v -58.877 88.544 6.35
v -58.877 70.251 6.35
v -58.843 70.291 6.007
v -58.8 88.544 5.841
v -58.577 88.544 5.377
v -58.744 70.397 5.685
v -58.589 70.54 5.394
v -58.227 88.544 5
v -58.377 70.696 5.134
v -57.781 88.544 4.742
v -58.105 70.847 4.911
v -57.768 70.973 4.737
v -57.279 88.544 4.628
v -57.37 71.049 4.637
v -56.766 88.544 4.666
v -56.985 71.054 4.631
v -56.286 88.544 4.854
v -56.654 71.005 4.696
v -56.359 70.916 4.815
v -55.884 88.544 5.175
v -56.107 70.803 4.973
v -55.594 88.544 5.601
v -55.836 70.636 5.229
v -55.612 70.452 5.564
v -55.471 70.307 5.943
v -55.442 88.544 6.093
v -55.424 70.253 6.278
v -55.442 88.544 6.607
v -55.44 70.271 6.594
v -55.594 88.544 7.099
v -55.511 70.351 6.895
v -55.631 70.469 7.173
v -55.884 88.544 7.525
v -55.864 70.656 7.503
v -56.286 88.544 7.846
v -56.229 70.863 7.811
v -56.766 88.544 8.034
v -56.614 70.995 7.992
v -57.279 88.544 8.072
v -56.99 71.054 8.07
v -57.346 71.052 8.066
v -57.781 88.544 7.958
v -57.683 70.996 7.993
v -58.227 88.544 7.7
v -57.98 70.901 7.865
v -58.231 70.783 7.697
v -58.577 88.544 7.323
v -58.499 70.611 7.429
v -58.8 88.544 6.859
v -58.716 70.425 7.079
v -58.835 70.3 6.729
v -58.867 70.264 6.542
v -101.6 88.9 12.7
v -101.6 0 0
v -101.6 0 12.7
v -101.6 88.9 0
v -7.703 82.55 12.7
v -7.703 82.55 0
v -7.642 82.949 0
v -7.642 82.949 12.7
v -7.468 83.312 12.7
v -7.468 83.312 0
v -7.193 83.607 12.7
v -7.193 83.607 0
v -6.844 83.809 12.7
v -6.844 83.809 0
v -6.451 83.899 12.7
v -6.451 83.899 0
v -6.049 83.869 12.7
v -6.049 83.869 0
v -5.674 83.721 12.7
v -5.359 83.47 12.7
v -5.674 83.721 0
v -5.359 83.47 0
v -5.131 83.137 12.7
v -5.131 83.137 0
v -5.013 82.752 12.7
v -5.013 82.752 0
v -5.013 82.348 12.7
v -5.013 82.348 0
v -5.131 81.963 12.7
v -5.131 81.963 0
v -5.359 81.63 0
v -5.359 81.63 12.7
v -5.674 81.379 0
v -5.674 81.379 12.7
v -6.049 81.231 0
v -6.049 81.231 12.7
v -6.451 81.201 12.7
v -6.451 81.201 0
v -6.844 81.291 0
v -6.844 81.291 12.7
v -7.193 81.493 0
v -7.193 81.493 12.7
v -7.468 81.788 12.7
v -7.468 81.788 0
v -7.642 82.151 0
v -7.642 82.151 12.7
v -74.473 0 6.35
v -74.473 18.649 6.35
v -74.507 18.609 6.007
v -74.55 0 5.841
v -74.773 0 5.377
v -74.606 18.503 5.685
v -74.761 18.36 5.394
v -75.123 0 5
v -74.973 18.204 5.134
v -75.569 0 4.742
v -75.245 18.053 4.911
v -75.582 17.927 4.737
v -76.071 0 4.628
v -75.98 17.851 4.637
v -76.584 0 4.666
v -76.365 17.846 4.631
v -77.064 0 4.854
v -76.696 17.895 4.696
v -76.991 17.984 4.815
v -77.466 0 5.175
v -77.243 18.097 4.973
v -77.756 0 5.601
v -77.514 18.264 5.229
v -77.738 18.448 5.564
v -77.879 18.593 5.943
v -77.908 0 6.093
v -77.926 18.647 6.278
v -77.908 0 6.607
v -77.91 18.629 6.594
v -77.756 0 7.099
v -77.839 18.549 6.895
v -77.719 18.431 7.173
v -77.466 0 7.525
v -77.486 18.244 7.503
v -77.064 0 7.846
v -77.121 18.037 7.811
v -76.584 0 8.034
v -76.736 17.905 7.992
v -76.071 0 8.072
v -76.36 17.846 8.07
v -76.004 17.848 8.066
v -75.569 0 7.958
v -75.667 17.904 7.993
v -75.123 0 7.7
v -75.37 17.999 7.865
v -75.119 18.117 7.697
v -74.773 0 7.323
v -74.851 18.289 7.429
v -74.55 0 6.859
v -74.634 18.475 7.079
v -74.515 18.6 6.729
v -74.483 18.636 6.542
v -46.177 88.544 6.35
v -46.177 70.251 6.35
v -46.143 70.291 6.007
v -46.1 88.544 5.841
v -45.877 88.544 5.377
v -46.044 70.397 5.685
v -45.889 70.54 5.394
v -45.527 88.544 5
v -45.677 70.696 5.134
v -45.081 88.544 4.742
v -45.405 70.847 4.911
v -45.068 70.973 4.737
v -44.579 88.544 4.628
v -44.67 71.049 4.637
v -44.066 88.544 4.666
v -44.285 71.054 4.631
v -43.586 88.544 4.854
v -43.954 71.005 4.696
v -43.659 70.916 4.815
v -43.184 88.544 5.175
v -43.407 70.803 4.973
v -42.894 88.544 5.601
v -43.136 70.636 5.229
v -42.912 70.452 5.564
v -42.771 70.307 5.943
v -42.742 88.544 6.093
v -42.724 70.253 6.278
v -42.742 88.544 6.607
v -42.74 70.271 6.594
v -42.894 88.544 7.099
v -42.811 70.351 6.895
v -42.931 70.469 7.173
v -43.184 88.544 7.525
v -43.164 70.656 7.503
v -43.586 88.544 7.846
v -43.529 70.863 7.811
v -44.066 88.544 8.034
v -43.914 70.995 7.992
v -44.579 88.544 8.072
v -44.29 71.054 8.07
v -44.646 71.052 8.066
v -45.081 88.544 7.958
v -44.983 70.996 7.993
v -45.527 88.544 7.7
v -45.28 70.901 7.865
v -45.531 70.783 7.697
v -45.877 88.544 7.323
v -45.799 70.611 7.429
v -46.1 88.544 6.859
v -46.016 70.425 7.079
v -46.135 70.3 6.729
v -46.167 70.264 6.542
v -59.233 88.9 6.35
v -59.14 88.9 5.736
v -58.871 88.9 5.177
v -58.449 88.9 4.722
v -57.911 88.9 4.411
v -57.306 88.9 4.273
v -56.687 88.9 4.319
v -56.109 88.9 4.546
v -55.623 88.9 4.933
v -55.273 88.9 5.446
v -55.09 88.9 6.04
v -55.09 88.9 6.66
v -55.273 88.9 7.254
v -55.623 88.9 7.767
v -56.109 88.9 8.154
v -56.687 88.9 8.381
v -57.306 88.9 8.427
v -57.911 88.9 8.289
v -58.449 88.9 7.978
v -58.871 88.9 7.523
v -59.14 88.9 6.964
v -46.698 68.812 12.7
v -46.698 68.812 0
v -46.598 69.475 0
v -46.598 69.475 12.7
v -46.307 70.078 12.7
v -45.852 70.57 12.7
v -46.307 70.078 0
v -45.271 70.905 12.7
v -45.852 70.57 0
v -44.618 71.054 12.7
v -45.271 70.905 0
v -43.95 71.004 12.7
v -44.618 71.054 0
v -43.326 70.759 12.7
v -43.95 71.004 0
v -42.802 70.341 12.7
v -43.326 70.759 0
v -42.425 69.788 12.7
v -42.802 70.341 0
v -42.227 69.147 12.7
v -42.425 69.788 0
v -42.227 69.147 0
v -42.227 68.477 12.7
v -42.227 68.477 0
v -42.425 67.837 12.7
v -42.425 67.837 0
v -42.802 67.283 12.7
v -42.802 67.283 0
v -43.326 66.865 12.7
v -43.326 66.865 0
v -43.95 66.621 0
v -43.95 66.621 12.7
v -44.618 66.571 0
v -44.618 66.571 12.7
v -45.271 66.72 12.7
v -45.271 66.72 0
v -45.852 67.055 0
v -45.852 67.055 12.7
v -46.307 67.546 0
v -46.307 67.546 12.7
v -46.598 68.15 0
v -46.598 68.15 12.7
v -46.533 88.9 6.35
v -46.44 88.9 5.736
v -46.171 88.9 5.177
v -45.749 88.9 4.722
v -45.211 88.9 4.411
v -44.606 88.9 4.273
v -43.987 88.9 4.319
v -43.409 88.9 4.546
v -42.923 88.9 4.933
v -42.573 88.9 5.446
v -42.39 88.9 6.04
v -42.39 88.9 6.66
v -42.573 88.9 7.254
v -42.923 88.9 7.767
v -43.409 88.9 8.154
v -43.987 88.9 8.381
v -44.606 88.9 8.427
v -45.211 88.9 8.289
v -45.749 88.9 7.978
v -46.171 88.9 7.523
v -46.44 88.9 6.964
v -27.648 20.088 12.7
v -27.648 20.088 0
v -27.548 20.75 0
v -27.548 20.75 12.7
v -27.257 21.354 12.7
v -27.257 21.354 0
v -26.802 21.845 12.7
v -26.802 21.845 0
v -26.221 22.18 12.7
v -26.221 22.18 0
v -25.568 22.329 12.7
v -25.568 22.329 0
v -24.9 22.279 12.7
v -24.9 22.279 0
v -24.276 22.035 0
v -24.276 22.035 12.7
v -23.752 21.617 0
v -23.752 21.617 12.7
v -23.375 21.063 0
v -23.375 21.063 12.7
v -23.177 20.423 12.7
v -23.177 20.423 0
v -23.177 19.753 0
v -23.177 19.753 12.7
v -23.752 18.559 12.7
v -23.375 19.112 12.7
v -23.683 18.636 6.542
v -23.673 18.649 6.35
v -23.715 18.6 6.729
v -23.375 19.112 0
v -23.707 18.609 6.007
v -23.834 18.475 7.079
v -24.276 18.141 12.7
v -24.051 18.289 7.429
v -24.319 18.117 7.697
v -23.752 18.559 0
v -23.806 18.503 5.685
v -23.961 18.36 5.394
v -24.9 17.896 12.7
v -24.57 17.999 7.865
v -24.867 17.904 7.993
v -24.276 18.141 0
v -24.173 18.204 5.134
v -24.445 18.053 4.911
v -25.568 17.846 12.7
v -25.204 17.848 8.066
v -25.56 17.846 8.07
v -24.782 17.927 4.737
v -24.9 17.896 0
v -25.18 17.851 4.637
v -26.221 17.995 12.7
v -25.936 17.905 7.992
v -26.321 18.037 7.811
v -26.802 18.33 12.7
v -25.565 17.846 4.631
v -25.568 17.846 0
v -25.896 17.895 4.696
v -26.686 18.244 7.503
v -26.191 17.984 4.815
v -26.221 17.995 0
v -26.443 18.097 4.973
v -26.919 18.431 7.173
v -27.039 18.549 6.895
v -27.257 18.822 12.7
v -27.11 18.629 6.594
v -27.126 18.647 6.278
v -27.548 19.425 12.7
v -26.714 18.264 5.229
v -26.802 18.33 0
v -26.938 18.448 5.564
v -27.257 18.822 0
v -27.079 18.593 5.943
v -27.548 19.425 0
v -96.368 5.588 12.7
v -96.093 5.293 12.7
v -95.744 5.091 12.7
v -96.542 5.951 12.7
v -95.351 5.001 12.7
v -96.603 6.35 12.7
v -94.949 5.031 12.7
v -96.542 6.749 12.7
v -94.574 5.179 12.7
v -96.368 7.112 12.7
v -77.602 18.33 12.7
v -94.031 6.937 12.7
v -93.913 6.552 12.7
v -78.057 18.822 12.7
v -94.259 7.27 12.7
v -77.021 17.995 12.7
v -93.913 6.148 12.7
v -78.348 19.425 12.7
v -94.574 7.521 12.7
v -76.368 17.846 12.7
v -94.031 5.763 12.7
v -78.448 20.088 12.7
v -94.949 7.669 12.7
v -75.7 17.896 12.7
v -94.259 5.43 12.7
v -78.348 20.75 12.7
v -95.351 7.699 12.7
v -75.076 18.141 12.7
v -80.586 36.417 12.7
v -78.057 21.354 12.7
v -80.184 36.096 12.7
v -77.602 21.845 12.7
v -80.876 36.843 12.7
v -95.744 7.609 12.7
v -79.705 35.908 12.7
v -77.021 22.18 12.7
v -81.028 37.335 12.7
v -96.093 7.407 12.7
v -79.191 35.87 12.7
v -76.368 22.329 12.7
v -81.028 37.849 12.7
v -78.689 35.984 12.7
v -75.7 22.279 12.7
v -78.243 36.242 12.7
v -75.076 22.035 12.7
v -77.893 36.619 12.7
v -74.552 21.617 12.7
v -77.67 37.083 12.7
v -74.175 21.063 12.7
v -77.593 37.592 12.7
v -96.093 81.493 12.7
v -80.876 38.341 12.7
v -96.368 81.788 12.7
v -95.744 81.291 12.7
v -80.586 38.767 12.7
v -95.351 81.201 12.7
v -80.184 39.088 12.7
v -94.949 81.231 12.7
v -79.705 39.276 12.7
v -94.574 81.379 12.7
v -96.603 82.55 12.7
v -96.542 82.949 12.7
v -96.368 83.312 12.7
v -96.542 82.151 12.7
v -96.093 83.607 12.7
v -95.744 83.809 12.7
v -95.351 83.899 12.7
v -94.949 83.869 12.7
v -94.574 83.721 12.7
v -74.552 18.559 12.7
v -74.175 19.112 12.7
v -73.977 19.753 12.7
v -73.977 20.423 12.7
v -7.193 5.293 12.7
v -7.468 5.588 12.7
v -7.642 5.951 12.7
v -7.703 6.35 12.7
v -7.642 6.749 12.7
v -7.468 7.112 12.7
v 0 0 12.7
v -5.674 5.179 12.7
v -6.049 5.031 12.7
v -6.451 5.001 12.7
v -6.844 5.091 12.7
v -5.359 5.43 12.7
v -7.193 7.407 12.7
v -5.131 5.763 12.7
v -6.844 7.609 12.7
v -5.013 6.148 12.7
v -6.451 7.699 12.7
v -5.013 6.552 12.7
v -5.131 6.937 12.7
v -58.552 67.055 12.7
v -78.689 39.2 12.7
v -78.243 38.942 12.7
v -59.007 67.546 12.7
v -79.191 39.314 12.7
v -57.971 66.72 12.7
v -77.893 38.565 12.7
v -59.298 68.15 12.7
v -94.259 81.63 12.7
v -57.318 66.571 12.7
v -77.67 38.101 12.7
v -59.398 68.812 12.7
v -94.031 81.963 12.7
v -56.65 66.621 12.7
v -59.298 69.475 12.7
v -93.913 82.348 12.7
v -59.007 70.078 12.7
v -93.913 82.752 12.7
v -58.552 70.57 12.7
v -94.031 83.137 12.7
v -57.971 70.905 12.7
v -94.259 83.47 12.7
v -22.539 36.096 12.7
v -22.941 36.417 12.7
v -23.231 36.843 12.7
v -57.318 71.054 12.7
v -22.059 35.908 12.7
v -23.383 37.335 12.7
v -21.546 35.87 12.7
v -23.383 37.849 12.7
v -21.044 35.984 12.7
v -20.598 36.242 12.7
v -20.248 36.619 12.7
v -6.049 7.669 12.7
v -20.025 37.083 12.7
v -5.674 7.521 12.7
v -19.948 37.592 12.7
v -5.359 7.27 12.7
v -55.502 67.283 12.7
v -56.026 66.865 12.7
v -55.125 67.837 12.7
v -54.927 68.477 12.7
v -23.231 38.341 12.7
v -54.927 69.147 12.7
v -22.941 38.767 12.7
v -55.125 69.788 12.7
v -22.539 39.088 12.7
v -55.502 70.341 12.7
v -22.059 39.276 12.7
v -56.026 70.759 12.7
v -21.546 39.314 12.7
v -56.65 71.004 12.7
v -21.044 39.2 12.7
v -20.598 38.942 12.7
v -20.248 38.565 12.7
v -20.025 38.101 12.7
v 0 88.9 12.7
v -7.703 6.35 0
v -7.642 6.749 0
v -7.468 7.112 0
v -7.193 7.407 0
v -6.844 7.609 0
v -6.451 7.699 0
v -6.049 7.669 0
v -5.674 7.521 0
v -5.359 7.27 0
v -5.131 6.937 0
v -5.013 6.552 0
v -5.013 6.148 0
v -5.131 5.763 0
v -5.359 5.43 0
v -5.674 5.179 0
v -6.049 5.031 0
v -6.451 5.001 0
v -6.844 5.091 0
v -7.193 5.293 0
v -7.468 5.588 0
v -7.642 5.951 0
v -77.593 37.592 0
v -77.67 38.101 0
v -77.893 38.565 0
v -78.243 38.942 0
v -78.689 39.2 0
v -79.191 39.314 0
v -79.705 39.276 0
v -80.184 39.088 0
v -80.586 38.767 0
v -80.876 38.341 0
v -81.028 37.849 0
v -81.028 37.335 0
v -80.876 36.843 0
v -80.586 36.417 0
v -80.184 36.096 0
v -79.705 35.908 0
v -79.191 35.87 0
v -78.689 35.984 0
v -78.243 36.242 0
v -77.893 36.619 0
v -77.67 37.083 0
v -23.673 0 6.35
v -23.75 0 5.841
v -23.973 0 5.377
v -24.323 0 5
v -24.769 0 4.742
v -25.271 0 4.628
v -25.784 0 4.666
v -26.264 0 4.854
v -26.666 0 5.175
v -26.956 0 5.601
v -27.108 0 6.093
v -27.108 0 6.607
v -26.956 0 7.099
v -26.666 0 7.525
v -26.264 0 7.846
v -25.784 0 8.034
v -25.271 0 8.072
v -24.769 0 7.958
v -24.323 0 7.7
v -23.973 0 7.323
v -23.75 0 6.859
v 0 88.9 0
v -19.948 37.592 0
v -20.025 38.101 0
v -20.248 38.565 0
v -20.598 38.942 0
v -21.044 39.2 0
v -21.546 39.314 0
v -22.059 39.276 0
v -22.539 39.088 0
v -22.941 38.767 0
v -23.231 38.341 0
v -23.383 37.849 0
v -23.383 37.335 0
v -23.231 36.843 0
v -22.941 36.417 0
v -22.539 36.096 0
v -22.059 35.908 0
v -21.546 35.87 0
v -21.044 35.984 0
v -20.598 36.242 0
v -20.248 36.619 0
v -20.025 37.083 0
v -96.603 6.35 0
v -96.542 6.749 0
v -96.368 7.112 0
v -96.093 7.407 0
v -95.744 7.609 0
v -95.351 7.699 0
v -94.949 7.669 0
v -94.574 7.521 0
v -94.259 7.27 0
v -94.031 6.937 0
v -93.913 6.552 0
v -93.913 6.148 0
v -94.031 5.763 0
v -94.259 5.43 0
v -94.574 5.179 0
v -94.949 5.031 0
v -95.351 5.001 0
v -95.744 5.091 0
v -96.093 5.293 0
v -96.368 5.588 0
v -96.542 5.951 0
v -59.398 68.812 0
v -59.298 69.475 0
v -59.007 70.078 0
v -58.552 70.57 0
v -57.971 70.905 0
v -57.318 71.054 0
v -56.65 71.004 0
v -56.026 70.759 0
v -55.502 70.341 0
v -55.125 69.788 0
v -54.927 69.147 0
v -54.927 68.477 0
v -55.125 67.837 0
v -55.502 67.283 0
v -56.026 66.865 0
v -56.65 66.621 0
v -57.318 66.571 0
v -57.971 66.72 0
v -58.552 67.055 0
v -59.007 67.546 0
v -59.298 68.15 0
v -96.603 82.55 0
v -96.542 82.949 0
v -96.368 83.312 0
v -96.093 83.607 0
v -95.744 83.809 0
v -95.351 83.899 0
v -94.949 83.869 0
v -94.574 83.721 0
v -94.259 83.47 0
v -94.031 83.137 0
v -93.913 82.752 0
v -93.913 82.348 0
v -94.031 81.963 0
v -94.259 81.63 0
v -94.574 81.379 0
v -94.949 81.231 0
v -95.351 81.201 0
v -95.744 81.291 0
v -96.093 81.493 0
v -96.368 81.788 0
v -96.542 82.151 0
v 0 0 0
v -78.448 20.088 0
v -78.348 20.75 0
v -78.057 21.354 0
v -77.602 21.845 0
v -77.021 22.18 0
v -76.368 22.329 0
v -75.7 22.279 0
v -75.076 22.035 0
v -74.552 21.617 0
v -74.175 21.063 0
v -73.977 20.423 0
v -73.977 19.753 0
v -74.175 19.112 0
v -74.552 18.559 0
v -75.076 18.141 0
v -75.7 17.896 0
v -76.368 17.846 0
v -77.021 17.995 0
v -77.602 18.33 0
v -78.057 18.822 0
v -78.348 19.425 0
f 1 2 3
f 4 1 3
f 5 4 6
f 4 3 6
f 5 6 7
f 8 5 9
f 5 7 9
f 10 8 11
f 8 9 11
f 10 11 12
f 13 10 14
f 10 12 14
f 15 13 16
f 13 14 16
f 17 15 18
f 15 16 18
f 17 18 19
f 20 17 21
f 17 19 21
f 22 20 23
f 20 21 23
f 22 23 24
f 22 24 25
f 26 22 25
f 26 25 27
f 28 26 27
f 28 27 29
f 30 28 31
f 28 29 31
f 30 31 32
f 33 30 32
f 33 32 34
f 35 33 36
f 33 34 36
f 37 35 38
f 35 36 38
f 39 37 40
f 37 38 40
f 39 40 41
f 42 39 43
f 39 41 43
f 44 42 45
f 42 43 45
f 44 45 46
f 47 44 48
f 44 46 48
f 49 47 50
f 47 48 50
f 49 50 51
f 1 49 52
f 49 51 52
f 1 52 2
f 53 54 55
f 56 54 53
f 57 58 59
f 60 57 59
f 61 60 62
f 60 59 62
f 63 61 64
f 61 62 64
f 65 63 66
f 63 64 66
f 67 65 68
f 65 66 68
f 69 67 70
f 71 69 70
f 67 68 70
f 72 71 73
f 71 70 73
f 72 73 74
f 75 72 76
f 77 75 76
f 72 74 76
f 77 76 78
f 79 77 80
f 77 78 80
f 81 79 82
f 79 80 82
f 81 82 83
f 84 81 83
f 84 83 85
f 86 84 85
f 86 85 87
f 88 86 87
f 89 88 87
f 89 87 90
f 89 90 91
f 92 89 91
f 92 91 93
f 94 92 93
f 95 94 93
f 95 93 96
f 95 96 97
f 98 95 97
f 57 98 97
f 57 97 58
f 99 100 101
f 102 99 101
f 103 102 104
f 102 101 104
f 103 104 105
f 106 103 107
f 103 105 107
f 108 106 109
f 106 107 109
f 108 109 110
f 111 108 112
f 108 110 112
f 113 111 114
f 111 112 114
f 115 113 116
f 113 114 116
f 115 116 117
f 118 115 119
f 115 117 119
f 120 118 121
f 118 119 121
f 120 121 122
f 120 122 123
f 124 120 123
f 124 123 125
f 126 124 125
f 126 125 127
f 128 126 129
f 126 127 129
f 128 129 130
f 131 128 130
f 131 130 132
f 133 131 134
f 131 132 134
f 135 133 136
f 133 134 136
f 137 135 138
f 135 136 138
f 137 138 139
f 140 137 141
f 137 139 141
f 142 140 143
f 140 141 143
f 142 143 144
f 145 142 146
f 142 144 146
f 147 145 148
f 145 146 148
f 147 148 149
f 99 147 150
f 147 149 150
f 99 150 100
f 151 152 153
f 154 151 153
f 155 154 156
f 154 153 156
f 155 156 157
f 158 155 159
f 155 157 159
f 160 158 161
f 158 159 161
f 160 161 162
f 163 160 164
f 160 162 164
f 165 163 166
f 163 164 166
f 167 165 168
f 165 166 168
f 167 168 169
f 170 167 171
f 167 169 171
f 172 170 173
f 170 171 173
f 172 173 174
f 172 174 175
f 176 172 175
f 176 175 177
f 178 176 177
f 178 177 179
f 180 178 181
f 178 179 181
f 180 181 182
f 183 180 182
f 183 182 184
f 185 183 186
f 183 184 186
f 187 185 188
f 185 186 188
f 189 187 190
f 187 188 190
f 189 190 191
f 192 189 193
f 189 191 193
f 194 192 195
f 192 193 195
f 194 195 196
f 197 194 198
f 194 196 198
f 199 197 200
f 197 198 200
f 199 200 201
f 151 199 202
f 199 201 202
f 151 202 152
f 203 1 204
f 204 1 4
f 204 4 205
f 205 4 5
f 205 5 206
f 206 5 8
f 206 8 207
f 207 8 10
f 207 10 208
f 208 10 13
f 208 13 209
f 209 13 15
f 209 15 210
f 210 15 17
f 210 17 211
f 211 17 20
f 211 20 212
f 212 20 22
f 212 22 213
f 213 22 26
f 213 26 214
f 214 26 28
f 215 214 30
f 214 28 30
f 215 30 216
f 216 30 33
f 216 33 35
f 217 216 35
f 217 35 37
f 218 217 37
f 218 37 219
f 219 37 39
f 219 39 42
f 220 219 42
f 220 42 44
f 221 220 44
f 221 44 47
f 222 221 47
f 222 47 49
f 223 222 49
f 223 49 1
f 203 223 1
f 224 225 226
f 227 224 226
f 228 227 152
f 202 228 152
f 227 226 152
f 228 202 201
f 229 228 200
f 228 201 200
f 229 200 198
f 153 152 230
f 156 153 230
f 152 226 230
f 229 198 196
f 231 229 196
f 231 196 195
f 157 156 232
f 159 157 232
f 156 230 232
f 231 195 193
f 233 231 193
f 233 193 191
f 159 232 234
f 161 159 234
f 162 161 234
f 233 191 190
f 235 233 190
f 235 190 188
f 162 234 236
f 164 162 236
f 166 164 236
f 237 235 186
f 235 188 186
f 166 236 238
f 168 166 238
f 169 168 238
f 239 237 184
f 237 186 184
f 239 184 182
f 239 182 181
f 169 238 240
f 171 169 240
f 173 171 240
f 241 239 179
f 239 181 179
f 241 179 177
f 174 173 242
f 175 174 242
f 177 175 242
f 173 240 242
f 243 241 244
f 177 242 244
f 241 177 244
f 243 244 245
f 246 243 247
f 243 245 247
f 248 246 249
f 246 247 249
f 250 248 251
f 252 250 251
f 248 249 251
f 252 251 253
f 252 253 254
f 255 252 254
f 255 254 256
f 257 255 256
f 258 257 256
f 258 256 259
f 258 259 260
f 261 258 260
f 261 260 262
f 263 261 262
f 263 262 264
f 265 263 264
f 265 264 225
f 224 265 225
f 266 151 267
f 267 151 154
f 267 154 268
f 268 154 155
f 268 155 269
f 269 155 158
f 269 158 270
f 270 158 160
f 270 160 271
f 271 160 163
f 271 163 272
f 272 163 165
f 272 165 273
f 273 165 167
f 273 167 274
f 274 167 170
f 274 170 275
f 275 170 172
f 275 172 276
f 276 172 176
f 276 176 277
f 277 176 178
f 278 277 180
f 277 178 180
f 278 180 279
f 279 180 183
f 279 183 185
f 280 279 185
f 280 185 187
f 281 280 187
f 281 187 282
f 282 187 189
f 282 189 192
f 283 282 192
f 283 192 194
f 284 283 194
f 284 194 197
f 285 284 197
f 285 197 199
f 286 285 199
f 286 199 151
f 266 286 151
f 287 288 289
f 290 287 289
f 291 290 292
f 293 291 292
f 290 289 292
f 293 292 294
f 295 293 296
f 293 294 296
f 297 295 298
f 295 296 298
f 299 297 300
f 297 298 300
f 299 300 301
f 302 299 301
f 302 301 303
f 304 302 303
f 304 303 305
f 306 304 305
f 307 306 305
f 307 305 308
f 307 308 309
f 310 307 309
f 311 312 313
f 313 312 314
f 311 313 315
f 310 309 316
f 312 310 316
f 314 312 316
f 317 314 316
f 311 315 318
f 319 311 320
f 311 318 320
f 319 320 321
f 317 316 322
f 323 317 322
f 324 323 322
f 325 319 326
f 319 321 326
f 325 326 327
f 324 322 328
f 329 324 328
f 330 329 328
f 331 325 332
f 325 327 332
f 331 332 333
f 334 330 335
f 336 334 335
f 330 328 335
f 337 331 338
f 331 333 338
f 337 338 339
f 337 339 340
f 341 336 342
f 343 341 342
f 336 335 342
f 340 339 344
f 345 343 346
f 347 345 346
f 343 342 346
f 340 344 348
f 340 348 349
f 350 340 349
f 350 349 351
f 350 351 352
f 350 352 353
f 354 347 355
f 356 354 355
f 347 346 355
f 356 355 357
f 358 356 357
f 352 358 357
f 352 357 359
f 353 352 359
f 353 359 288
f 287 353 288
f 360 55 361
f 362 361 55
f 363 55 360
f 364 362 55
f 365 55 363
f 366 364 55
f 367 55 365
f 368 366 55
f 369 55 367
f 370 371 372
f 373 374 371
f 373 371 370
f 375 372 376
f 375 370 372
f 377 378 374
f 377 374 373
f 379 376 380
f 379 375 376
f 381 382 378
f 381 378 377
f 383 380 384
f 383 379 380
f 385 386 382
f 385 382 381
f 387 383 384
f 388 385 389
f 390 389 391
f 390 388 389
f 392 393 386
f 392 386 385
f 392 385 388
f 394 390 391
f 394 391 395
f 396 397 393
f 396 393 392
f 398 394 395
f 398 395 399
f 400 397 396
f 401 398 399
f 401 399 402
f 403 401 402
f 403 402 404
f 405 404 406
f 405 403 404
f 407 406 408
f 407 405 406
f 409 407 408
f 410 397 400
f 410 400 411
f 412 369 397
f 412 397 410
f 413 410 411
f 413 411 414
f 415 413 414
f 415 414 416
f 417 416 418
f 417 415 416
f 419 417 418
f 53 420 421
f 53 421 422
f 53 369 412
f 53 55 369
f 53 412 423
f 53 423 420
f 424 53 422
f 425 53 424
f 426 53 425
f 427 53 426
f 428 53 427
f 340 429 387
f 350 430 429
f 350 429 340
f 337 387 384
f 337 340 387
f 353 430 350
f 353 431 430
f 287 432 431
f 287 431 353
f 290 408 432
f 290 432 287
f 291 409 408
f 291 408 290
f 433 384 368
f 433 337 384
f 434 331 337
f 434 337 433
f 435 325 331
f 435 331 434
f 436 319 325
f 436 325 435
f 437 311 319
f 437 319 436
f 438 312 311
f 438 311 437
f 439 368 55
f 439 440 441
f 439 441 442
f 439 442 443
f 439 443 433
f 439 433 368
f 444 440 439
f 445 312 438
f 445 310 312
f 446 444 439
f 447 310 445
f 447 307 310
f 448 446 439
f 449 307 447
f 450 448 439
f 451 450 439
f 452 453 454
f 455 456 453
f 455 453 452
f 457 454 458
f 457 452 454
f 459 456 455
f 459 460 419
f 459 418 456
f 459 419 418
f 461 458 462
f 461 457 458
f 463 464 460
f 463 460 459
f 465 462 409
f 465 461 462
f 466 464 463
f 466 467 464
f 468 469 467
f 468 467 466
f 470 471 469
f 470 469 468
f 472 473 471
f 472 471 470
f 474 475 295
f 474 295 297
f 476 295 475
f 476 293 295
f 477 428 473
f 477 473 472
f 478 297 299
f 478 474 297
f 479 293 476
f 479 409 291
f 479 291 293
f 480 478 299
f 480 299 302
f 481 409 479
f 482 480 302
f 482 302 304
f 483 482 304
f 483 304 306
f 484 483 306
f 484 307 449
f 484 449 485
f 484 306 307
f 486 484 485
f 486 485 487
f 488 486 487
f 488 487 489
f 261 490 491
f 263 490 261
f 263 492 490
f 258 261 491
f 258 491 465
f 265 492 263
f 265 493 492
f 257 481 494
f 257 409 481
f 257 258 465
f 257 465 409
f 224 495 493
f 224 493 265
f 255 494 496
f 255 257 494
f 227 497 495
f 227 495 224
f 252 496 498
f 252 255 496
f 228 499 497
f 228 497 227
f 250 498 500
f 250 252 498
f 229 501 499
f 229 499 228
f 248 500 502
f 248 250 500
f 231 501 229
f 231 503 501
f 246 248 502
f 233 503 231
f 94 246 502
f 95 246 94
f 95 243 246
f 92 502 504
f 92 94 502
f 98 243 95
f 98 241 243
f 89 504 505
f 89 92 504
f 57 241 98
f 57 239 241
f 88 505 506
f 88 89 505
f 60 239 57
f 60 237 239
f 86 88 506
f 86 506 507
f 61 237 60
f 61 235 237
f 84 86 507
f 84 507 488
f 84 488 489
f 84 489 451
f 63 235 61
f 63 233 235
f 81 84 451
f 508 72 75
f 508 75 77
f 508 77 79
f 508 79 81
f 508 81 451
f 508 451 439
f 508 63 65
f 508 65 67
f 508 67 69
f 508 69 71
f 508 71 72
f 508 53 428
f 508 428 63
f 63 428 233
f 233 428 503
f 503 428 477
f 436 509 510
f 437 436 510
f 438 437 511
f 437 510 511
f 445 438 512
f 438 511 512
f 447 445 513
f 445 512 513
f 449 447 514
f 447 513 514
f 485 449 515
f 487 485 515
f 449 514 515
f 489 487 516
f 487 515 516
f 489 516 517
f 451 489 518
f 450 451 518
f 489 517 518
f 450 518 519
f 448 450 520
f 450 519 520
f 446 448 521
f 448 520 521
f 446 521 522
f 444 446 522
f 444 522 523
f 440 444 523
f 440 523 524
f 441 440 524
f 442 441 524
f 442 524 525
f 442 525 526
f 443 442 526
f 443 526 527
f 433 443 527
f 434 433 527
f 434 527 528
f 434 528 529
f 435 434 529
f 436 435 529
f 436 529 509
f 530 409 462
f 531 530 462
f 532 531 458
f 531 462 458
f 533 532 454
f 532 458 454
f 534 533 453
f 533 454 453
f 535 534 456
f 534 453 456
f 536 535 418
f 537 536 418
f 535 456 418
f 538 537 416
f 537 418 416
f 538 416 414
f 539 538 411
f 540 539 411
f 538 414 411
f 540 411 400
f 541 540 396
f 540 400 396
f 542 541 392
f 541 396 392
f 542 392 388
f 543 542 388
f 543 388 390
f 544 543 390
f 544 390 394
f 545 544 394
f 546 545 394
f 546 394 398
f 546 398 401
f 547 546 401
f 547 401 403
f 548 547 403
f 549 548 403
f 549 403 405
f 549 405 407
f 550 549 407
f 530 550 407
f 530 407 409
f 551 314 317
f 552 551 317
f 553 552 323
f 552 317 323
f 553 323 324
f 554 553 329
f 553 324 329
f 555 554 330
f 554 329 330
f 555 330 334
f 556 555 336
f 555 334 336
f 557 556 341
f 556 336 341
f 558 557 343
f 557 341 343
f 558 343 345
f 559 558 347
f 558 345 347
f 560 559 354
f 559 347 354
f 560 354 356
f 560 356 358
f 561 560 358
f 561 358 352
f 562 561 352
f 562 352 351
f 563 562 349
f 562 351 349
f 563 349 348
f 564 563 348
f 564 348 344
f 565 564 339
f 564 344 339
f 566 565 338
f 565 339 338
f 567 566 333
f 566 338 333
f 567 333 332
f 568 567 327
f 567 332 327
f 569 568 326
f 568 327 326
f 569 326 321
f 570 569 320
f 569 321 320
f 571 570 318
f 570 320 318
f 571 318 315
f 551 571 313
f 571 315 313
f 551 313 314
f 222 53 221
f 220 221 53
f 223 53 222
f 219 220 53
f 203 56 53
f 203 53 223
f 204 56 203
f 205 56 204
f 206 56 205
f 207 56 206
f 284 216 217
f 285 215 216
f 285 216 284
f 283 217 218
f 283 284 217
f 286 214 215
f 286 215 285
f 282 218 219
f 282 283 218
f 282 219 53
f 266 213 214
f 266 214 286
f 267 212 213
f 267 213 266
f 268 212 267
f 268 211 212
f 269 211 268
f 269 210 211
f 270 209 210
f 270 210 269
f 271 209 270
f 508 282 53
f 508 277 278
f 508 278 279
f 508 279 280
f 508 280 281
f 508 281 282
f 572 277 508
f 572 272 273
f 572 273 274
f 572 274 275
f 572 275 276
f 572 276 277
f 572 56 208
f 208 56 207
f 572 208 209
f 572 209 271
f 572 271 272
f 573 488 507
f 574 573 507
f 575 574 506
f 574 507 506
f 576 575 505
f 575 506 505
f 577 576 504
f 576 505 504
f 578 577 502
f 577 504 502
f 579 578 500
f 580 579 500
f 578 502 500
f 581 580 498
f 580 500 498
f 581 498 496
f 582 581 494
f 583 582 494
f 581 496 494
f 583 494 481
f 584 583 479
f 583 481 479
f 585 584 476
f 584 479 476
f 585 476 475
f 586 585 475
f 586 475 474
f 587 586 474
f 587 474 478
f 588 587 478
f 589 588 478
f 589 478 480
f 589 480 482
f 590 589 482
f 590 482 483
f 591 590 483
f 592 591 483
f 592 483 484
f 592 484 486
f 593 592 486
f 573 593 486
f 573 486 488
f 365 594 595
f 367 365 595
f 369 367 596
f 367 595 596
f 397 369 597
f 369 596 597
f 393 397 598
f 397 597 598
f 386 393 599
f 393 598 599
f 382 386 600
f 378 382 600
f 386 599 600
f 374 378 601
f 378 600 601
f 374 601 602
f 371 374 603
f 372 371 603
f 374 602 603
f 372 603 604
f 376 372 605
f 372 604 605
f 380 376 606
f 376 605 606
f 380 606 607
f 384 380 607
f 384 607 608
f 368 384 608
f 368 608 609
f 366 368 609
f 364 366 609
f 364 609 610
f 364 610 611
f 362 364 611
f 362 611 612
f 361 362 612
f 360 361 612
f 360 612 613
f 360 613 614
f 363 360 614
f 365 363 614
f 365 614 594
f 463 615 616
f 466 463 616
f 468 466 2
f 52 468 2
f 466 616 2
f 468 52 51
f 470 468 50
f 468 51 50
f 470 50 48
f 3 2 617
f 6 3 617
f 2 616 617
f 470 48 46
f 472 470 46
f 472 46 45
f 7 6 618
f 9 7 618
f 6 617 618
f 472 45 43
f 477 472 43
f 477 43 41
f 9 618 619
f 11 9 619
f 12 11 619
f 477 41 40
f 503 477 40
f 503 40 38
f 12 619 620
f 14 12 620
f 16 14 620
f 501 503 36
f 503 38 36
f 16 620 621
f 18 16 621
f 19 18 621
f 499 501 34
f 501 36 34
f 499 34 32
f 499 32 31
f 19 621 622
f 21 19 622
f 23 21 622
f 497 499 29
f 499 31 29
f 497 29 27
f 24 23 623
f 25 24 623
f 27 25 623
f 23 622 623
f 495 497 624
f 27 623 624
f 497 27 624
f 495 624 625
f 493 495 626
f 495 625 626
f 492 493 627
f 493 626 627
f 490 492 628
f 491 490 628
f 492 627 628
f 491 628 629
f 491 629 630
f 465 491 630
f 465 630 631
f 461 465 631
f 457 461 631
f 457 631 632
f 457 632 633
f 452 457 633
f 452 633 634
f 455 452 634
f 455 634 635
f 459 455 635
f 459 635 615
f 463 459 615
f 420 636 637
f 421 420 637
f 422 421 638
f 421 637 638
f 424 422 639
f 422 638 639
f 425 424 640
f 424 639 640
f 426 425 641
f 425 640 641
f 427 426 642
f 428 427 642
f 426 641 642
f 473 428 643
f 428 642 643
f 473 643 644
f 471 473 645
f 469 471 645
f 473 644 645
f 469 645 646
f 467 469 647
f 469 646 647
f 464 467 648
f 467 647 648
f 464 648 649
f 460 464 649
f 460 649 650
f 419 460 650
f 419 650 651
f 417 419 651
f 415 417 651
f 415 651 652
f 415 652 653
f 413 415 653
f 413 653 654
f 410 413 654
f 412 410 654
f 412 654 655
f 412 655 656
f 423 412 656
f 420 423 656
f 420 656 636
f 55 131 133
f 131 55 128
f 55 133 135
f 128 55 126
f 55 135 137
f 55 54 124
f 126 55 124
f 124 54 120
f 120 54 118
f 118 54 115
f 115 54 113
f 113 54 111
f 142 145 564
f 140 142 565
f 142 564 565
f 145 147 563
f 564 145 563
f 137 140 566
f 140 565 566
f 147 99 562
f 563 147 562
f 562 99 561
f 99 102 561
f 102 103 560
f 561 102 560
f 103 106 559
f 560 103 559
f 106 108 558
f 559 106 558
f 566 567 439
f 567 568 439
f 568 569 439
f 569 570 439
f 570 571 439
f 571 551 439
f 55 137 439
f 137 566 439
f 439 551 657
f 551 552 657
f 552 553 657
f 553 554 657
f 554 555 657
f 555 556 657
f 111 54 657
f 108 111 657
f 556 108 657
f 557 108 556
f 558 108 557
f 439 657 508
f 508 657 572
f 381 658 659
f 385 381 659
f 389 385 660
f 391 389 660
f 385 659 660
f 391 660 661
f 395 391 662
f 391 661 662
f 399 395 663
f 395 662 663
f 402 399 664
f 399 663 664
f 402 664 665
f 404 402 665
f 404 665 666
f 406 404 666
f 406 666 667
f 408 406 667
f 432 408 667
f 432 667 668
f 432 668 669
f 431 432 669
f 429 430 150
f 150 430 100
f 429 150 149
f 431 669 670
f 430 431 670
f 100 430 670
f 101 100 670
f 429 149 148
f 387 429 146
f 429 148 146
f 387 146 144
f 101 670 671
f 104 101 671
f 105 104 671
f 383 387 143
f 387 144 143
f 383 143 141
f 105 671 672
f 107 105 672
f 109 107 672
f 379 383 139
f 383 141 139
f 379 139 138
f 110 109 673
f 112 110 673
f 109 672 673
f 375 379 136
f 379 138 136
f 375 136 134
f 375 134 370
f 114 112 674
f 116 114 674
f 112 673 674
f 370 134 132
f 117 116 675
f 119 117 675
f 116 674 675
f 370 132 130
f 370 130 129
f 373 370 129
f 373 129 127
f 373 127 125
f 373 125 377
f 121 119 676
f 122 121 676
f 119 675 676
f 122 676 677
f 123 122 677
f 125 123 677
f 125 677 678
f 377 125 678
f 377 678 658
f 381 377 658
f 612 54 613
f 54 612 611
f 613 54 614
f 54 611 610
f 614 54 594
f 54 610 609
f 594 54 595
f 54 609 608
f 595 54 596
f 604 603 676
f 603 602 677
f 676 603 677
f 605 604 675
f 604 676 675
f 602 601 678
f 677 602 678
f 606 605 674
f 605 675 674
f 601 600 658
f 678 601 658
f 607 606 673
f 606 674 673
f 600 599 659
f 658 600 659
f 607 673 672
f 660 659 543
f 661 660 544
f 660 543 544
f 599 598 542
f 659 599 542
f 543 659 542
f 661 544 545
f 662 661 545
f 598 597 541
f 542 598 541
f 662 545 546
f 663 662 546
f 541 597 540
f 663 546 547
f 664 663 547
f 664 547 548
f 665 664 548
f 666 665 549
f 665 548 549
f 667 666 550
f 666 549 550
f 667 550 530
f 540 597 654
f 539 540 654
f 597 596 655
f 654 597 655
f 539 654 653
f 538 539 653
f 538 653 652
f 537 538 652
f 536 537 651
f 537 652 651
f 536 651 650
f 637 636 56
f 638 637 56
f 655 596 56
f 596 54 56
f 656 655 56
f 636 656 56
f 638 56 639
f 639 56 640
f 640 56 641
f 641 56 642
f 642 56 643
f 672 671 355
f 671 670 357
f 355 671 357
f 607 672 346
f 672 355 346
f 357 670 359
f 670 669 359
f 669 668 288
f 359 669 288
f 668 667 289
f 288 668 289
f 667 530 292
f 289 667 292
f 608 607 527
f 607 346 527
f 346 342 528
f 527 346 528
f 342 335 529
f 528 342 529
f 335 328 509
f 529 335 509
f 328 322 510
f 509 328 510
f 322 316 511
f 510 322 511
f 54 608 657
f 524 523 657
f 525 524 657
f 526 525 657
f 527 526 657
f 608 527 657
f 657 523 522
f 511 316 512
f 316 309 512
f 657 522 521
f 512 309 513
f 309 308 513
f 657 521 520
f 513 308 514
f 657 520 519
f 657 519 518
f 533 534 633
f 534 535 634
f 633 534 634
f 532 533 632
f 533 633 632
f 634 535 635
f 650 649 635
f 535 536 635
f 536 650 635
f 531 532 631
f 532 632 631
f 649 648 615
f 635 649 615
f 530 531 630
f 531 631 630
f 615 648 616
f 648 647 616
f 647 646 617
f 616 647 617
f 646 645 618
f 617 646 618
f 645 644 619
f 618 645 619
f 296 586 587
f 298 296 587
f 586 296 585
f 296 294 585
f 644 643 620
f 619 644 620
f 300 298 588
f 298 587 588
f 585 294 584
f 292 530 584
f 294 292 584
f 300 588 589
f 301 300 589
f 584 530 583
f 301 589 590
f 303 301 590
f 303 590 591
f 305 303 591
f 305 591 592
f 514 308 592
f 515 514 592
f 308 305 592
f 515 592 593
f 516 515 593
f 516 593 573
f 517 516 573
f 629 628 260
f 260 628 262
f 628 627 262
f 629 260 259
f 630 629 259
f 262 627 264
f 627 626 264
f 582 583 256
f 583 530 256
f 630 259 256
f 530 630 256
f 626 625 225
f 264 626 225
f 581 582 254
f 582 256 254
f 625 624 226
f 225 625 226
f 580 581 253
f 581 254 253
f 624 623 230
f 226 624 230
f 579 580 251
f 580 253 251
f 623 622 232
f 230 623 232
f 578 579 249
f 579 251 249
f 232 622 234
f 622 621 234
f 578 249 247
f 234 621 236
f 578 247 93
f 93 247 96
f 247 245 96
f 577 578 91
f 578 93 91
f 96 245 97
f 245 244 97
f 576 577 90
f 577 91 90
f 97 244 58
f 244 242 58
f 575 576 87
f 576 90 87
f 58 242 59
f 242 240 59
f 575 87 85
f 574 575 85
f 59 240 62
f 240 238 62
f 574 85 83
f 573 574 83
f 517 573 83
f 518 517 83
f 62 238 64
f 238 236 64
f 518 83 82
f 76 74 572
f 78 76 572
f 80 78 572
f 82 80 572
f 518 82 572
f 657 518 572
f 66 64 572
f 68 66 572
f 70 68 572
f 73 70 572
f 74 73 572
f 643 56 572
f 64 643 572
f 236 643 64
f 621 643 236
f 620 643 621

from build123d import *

# Parameters (mm, degrees)
SKETCH1_W                       = 101.6
SKETCH1_H                       = 88.9
BOSS_EXTRUDE1_DEPTH             = 12.7
F_8_32_TAPPED_HOLE1_D           = 3.4544
F_8_32_TAPPED_HOLE1_DEPTH       = 19.05
F_8_32_TAPPED_HOLE1_CSINK_D     = 4.1656
F_8_32_TAPPED_HOLE1_CSINK_ANGLE = 90
F_8_32_TAPPED_HOLE1_TIP         = 1.037806461
F_8_CLEARANCE_HOLE2_D           = 4.4958
F_8_CLEARANCE_HOLE2_DEPTH       = 25.4
F_8_CLEARANCE_HOLE2_TIP         = 1.350674586
F_6_32_TAPPED_HOLE1_D           = 2.7051
F_8_32_TAPPED_HOLE2_D           = 3.4544
F_8_32_TAPPED_HOLE3_D           = 3.4544
F_8_32_TAPPED_HOLE3_DEPTH       = 19.05
F_8_32_TAPPED_HOLE3_TIP         = 1.037806461
F_8_CLEARANCE_HOLE3_D           = 4.4958
F_8_CLEARANCE_HOLE3_DEPTH       = 19.05
F_8_CLEARANCE_HOLE3_TIP         = 1.350674586


with BuildPart() as part:
    # Sketch1 → Boss-Extrude1 (new body)
    with BuildSketch(Plane.XY):
        with Locations((-50.8, 44.45)):
            Rectangle(SKETCH1_W, SKETCH1_H)
    extrude(amount=BOSS_EXTRUDE1_DEPTH)

    # #8-32 Tapped Hole1
    with Locations(Plane(origin=(0, 88.9, 0), x_dir=(1, 0, 0), z_dir=(0, 1, 0))):
        with Locations((-44.45, -6.35), (-57.15, -6.35)):
            CounterSinkHole(F_8_32_TAPPED_HOLE1_D / 2, F_8_32_TAPPED_HOLE1_CSINK_D / 2, depth=F_8_32_TAPPED_HOLE1_DEPTH, counter_sink_angle=F_8_32_TAPPED_HOLE1_CSINK_ANGLE)
            with Locations((0, 0, -(F_8_32_TAPPED_HOLE1_DEPTH + F_8_32_TAPPED_HOLE1_TIP / 2))):  # 118° drill point
                Cone(0, F_8_32_TAPPED_HOLE1_D / 2, F_8_32_TAPPED_HOLE1_TIP, mode=Mode.SUBTRACT)

    # #8 Clearance Hole2
    with Locations(Plane.XY.offset(12.7)):
        with Locations((-44.45, 68.812193539), (-57.15, 68.812193539)):
            Hole(F_8_CLEARANCE_HOLE2_D / 2, depth=F_8_CLEARANCE_HOLE2_DEPTH)
            with Locations((0, 0, -(F_8_CLEARANCE_HOLE2_DEPTH + F_8_CLEARANCE_HOLE2_TIP / 2))):  # 118° drill point
                Cone(0, F_8_CLEARANCE_HOLE2_D / 2, F_8_CLEARANCE_HOLE2_TIP, mode=Mode.SUBTRACT)

    # #6-32 Tapped Hole1 (through all)
    with Locations(Plane.XY.offset(12.7)):
        with Locations((-95.25, 6.35), (-95.25, 82.55), (-6.35, 6.35), (-6.35, 82.55)):
            Hole(F_6_32_TAPPED_HOLE1_D / 2)

    # #8-32 Tapped Hole2 (through all)
    with Locations(Plane(origin=(0, 0, 0), x_dir=(-1, 0, 0), z_dir=(0, 0, -1))):
        with Locations((79.3203, 37.592), (21.675, 37.592)):
            Hole(F_8_32_TAPPED_HOLE2_D / 2)

    # #8-32 Tapped Hole3
    with Locations(Plane(origin=(0, 0, 0), x_dir=(-1, 0, 0), z_dir=(0, -1, 0))):
        with Locations((76.2, -6.35), (25.4, -6.35)):
            Hole(F_8_32_TAPPED_HOLE3_D / 2, depth=F_8_32_TAPPED_HOLE3_DEPTH)
            with Locations((0, 0, -(F_8_32_TAPPED_HOLE3_DEPTH + F_8_32_TAPPED_HOLE3_TIP / 2))):  # 118° drill point
                Cone(0, F_8_32_TAPPED_HOLE3_D / 2, F_8_32_TAPPED_HOLE3_TIP, mode=Mode.SUBTRACT)

    # #8 Clearance Hole3
    with Locations(Plane.XY.offset(12.7)):
        with Locations((-76.2, 20.087806461), (-25.4, 20.087806461)):
            Hole(F_8_CLEARANCE_HOLE3_D / 2, depth=F_8_CLEARANCE_HOLE3_DEPTH)
            with Locations((0, 0, -(F_8_CLEARANCE_HOLE3_DEPTH + F_8_CLEARANCE_HOLE3_TIP / 2))):  # 118° drill point
                Cone(0, F_8_CLEARANCE_HOLE3_D / 2, F_8_CLEARANCE_HOLE3_TIP, mode=Mode.SUBTRACT)


solid = part.part
